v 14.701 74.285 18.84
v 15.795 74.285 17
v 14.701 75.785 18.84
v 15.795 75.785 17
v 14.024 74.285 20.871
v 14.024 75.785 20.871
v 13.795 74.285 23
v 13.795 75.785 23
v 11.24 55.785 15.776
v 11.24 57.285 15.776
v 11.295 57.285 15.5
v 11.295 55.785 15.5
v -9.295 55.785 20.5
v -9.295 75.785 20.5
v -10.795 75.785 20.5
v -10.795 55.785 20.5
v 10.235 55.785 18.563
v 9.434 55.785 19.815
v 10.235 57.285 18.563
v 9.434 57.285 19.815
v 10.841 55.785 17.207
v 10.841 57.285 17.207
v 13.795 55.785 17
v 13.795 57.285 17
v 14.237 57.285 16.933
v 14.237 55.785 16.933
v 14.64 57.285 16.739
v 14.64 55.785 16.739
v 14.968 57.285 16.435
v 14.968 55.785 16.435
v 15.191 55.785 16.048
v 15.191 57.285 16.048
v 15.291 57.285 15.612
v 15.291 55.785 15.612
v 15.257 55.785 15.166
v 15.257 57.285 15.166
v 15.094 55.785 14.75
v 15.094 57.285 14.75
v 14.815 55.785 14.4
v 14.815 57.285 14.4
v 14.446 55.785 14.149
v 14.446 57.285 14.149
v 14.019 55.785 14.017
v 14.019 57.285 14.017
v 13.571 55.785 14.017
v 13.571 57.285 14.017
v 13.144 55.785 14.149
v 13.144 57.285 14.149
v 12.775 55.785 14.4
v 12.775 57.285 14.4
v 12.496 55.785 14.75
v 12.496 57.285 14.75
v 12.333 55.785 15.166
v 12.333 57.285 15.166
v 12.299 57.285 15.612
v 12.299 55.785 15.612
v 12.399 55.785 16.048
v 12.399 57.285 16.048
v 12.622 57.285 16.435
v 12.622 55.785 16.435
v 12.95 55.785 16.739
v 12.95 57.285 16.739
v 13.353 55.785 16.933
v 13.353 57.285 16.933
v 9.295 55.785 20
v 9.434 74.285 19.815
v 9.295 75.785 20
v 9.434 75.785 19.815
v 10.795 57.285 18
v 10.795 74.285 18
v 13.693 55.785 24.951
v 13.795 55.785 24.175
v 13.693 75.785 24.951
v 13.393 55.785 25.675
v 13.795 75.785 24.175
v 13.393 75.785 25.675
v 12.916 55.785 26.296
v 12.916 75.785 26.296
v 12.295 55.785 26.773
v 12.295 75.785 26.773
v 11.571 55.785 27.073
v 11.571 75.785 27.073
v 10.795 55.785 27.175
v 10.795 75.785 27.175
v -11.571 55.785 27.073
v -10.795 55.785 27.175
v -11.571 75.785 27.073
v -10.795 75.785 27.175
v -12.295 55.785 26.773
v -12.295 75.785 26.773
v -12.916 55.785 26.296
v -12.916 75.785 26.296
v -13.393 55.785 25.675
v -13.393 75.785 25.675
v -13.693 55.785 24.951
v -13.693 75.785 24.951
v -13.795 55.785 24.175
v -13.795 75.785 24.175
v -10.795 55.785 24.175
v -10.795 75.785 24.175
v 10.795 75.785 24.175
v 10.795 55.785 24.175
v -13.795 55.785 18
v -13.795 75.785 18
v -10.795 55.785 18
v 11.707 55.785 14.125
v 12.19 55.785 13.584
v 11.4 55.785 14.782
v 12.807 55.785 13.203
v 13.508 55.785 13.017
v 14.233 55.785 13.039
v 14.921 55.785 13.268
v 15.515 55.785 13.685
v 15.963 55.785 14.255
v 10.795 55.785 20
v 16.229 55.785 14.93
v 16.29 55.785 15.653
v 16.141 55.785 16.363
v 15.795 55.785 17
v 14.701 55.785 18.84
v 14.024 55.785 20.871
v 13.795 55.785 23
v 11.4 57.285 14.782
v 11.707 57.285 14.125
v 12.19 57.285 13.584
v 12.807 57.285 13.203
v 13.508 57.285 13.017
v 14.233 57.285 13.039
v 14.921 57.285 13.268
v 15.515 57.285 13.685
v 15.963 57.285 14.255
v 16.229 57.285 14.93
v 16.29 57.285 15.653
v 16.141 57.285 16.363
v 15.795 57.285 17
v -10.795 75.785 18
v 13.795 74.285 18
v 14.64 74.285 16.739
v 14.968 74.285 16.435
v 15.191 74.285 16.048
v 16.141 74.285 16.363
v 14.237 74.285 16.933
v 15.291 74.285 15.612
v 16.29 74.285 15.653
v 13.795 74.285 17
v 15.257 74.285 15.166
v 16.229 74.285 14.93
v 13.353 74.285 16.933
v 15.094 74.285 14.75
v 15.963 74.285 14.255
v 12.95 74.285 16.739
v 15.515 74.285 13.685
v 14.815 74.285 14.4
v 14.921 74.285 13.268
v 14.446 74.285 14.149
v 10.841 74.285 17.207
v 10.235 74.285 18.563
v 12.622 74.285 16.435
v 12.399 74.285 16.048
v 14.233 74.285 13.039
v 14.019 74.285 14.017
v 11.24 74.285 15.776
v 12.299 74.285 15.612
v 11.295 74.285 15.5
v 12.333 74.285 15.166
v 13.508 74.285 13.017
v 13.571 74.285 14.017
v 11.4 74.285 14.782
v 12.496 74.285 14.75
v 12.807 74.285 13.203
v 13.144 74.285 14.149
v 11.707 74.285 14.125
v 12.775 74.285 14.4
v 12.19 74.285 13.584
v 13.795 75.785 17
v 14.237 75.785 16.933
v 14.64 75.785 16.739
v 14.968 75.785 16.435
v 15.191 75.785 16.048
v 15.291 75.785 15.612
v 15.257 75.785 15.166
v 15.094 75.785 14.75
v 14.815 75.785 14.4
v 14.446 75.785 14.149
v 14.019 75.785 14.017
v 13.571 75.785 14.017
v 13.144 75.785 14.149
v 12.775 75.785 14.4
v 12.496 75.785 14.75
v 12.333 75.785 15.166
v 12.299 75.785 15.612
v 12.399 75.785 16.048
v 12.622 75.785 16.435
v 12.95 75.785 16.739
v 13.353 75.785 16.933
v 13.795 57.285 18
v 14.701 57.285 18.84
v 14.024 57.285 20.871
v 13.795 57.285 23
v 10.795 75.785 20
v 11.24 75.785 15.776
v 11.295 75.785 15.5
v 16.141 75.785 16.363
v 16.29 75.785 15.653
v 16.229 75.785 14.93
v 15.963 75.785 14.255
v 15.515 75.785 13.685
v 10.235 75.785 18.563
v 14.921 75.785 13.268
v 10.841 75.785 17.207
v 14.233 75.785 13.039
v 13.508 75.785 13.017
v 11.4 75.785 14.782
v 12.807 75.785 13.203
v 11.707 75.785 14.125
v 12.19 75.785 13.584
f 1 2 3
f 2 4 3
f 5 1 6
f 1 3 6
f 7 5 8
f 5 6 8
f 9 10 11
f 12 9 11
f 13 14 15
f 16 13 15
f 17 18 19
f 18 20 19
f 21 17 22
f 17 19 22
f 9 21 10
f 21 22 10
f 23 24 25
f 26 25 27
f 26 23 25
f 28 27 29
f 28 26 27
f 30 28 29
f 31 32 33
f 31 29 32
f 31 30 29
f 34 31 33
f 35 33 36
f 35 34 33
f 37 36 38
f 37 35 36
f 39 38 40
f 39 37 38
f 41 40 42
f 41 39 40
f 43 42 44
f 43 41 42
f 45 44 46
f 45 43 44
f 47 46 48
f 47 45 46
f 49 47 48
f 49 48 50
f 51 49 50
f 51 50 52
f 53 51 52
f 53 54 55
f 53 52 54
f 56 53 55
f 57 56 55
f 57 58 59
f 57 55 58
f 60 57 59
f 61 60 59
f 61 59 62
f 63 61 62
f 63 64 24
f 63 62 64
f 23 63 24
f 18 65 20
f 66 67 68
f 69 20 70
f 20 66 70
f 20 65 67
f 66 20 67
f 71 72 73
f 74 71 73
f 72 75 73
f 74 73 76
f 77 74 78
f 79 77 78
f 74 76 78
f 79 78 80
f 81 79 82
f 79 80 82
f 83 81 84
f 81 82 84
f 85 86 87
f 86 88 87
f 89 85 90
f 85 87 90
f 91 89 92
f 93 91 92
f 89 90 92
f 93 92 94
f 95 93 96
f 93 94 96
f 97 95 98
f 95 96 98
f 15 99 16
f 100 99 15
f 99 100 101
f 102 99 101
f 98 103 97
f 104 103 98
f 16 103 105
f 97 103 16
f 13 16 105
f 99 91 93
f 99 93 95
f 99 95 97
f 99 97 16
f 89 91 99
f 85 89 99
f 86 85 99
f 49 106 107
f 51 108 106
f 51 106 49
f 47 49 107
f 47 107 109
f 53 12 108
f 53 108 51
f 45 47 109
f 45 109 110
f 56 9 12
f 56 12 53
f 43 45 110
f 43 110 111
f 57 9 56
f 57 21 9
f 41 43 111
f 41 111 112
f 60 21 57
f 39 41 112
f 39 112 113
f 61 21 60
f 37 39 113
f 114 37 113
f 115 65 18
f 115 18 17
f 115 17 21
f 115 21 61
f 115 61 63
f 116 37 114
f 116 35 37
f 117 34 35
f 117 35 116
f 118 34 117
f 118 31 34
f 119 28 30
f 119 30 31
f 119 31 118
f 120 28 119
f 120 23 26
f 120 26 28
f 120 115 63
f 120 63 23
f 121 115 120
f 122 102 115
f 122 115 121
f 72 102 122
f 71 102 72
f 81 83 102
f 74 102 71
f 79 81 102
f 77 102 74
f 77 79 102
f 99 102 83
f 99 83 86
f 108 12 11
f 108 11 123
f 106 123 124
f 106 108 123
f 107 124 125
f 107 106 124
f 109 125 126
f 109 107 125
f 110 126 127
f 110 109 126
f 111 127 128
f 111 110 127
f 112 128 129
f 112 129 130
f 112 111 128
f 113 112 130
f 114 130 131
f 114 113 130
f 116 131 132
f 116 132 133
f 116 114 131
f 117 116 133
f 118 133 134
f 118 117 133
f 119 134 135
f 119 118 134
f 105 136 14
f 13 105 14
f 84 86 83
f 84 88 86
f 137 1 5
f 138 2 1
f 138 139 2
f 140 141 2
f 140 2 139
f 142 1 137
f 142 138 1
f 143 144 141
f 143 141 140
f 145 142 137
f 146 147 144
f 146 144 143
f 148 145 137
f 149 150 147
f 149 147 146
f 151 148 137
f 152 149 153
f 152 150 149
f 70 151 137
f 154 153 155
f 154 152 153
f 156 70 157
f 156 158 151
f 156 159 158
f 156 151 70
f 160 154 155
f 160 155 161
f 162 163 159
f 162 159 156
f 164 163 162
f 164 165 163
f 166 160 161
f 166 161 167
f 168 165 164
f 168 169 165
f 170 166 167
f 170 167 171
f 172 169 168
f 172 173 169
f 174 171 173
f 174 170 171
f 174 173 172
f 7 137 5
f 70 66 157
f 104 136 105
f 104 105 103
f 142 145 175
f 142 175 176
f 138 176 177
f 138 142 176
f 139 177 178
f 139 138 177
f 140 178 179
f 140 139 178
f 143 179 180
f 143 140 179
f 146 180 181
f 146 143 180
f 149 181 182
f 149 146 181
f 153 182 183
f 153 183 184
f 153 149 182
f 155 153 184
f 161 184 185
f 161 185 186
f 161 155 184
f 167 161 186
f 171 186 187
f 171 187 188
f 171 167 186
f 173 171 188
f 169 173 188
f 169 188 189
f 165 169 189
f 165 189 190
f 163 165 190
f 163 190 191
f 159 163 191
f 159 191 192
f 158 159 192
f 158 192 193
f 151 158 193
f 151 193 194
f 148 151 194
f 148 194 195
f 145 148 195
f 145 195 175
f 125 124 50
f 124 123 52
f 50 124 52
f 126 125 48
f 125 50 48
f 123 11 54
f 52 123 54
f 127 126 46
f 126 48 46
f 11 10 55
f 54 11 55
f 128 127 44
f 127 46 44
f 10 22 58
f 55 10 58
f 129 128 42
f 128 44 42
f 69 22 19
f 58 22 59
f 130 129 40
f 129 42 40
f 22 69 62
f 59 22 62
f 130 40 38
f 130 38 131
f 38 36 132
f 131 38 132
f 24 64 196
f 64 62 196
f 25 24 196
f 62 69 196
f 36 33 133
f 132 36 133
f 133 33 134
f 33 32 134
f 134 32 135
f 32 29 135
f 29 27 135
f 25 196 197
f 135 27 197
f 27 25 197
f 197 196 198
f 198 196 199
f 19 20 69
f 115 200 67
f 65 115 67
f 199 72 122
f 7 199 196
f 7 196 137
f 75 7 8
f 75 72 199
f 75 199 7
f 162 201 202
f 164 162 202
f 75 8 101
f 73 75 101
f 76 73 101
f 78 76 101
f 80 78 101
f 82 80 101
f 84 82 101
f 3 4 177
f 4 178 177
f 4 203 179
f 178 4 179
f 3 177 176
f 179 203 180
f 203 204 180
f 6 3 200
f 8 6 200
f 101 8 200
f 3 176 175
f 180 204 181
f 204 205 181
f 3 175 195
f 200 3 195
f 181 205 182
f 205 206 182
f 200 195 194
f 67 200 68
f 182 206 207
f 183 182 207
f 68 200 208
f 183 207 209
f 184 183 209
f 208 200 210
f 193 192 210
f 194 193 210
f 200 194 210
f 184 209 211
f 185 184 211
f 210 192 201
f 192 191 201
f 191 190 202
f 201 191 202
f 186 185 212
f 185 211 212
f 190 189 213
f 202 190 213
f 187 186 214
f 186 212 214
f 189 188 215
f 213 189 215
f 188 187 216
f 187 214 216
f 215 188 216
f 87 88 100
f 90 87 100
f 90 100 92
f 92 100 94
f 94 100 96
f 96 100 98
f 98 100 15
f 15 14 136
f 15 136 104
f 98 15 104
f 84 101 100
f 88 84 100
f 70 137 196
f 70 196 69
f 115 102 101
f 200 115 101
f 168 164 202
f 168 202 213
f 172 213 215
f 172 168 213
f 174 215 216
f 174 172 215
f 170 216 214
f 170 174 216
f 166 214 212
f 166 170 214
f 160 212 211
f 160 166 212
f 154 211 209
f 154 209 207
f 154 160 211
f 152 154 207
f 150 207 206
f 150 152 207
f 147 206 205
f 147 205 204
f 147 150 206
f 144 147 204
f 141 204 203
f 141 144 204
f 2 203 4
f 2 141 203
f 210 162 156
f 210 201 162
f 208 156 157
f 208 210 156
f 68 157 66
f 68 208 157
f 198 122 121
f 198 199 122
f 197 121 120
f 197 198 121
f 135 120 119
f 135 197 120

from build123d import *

# Parameters (mm, degrees)
SKETCH1_W           = 27.59
SKETCH1_H           = 20
BOSS_EXTRUDE1_DEPTH = 3
SKETCH2_W           = 3
SKETCH2_H           = 20
BOSS_EXTRUDE2_DEPTH = 6.175
BOSS_EXTRUDE3_DEPTH = 20
BOSS_EXTRUDE5_DEPTH = 1.5
BOSS_EXTRUDE6_START = -1.5
BOSS_EXTRUDE6_DEPTH = 1.5
CUT_EXTRUDE1_START  = -20
SKETCH8_R           = 1.5
CUT_EXTRUDE1_DEPTH  = 20
FILLET1_R           = 10
FILLET2_R           = 10
FILLET4_R           = 3


with BuildPart() as part:
    # Sketch1 → Boss-Extrude1 (new body)
    with BuildSketch(Plane.XY.offset(24.175)):
        with Locations((0, 65.784687602)):
            Rectangle(SKETCH1_W, SKETCH1_H)
    extrude(amount=BOSS_EXTRUDE1_DEPTH)

    # Sketch2 → Boss-Extrude2 (add)
    with BuildSketch(Plane(origin=(0, 0, 24.175), x_dir=(-1, 0, 0), z_dir=(0, 0, -1))):
        with Locations((-12.295, 65.784687602)):
            Rectangle(SKETCH2_W, SKETCH2_H)
        with Locations((12.295, 65.784687602)):
            Rectangle(SKETCH2_W, SKETCH2_H)
    extrude(amount=BOSS_EXTRUDE2_DEPTH)

    # Sketch4 → Boss-Extrude3 (add)
    with BuildSketch(Plane(origin=(0, 75.784687602, 0), x_dir=(1, 0, 0), z_dir=(0, 1, 0))):
        Polygon((-10.795, -20.5), (-10.795, -18), (-9.295, -20.5), align=None)
        Polygon((10.795, -18), (10.795, -20), (9.295, -20), align=None)
    extrude(amount=-BOSS_EXTRUDE3_DEPTH)

    # Sketch6 → Boss-Extrude5 (add)
    with BuildSketch(Plane.XZ.offset(-55.784687602)):
        with BuildLine():
            Line((10.795, 18), (11.295, 15.5))
            ThreePointArc((11.295, 15.5), (15.562766953, 13.732233047), (13.795, 18))
            Line((13.795, 18), (10.795, 18))
        make_face()
    extrude(amount=-BOSS_EXTRUDE5_DEPTH)

    # Sketch7 → Boss-Extrude6 (add)
    with BuildSketch(Plane(origin=(0, 75.784687602, 0), x_dir=(1, 0, 0), z_dir=(0, 1, 0)).offset(BOSS_EXTRUDE6_START)):
        with BuildLine():
            Line((10.795, -18), (11.295, -15.5))
            ThreePointArc((11.295, -15.5), (15.562766953, -13.732233047), (13.795, -18))
            Line((13.795, -18), (10.795, -18))
        make_face()
    extrude(amount=BOSS_EXTRUDE6_DEPTH)

    # Sketch8 → Cut-Extrude1 (cut)
    with BuildSketch(Plane(origin=(0, 75.784687602, 0), x_dir=(1, 0, 0), z_dir=(0, 1, 0)).offset(CUT_EXTRUDE1_START)):
        with Locations(Location((13.795, -15.5, 0), (0, 0, 270))):
            Circle(SKETCH8_R)
    extrude(amount=CUT_EXTRUDE1_DEPTH, mode=Mode.SUBTRACT)

    # Fillet1
    fillet1_edges = [part.edges().sort_by_distance(p)[0] for p in [
        (13.795, 75.034687602, 18),
        (13.795, 56.534687602, 18),
    ]]
    fillet(fillet1_edges, radius=FILLET1_R)

    # Fillet2
    fillet2_edges = [part.edges().sort_by_distance(p)[0] for p in [
        (10.795, 56.534687602, 18),
        (10.795, 75.034687602, 18),
    ]]
    fillet(fillet2_edges, radius=FILLET2_R)

    # Fillet4
    fillet4_edges = [part.edges().sort_by_distance(p)[0] for p in [
        (13.795, 65.784687602, 27.175),
        (-13.795, 65.784687602, 27.175),
    ]]
    fillet(fillet4_edges, radius=FILLET4_R)


solid = part.part
